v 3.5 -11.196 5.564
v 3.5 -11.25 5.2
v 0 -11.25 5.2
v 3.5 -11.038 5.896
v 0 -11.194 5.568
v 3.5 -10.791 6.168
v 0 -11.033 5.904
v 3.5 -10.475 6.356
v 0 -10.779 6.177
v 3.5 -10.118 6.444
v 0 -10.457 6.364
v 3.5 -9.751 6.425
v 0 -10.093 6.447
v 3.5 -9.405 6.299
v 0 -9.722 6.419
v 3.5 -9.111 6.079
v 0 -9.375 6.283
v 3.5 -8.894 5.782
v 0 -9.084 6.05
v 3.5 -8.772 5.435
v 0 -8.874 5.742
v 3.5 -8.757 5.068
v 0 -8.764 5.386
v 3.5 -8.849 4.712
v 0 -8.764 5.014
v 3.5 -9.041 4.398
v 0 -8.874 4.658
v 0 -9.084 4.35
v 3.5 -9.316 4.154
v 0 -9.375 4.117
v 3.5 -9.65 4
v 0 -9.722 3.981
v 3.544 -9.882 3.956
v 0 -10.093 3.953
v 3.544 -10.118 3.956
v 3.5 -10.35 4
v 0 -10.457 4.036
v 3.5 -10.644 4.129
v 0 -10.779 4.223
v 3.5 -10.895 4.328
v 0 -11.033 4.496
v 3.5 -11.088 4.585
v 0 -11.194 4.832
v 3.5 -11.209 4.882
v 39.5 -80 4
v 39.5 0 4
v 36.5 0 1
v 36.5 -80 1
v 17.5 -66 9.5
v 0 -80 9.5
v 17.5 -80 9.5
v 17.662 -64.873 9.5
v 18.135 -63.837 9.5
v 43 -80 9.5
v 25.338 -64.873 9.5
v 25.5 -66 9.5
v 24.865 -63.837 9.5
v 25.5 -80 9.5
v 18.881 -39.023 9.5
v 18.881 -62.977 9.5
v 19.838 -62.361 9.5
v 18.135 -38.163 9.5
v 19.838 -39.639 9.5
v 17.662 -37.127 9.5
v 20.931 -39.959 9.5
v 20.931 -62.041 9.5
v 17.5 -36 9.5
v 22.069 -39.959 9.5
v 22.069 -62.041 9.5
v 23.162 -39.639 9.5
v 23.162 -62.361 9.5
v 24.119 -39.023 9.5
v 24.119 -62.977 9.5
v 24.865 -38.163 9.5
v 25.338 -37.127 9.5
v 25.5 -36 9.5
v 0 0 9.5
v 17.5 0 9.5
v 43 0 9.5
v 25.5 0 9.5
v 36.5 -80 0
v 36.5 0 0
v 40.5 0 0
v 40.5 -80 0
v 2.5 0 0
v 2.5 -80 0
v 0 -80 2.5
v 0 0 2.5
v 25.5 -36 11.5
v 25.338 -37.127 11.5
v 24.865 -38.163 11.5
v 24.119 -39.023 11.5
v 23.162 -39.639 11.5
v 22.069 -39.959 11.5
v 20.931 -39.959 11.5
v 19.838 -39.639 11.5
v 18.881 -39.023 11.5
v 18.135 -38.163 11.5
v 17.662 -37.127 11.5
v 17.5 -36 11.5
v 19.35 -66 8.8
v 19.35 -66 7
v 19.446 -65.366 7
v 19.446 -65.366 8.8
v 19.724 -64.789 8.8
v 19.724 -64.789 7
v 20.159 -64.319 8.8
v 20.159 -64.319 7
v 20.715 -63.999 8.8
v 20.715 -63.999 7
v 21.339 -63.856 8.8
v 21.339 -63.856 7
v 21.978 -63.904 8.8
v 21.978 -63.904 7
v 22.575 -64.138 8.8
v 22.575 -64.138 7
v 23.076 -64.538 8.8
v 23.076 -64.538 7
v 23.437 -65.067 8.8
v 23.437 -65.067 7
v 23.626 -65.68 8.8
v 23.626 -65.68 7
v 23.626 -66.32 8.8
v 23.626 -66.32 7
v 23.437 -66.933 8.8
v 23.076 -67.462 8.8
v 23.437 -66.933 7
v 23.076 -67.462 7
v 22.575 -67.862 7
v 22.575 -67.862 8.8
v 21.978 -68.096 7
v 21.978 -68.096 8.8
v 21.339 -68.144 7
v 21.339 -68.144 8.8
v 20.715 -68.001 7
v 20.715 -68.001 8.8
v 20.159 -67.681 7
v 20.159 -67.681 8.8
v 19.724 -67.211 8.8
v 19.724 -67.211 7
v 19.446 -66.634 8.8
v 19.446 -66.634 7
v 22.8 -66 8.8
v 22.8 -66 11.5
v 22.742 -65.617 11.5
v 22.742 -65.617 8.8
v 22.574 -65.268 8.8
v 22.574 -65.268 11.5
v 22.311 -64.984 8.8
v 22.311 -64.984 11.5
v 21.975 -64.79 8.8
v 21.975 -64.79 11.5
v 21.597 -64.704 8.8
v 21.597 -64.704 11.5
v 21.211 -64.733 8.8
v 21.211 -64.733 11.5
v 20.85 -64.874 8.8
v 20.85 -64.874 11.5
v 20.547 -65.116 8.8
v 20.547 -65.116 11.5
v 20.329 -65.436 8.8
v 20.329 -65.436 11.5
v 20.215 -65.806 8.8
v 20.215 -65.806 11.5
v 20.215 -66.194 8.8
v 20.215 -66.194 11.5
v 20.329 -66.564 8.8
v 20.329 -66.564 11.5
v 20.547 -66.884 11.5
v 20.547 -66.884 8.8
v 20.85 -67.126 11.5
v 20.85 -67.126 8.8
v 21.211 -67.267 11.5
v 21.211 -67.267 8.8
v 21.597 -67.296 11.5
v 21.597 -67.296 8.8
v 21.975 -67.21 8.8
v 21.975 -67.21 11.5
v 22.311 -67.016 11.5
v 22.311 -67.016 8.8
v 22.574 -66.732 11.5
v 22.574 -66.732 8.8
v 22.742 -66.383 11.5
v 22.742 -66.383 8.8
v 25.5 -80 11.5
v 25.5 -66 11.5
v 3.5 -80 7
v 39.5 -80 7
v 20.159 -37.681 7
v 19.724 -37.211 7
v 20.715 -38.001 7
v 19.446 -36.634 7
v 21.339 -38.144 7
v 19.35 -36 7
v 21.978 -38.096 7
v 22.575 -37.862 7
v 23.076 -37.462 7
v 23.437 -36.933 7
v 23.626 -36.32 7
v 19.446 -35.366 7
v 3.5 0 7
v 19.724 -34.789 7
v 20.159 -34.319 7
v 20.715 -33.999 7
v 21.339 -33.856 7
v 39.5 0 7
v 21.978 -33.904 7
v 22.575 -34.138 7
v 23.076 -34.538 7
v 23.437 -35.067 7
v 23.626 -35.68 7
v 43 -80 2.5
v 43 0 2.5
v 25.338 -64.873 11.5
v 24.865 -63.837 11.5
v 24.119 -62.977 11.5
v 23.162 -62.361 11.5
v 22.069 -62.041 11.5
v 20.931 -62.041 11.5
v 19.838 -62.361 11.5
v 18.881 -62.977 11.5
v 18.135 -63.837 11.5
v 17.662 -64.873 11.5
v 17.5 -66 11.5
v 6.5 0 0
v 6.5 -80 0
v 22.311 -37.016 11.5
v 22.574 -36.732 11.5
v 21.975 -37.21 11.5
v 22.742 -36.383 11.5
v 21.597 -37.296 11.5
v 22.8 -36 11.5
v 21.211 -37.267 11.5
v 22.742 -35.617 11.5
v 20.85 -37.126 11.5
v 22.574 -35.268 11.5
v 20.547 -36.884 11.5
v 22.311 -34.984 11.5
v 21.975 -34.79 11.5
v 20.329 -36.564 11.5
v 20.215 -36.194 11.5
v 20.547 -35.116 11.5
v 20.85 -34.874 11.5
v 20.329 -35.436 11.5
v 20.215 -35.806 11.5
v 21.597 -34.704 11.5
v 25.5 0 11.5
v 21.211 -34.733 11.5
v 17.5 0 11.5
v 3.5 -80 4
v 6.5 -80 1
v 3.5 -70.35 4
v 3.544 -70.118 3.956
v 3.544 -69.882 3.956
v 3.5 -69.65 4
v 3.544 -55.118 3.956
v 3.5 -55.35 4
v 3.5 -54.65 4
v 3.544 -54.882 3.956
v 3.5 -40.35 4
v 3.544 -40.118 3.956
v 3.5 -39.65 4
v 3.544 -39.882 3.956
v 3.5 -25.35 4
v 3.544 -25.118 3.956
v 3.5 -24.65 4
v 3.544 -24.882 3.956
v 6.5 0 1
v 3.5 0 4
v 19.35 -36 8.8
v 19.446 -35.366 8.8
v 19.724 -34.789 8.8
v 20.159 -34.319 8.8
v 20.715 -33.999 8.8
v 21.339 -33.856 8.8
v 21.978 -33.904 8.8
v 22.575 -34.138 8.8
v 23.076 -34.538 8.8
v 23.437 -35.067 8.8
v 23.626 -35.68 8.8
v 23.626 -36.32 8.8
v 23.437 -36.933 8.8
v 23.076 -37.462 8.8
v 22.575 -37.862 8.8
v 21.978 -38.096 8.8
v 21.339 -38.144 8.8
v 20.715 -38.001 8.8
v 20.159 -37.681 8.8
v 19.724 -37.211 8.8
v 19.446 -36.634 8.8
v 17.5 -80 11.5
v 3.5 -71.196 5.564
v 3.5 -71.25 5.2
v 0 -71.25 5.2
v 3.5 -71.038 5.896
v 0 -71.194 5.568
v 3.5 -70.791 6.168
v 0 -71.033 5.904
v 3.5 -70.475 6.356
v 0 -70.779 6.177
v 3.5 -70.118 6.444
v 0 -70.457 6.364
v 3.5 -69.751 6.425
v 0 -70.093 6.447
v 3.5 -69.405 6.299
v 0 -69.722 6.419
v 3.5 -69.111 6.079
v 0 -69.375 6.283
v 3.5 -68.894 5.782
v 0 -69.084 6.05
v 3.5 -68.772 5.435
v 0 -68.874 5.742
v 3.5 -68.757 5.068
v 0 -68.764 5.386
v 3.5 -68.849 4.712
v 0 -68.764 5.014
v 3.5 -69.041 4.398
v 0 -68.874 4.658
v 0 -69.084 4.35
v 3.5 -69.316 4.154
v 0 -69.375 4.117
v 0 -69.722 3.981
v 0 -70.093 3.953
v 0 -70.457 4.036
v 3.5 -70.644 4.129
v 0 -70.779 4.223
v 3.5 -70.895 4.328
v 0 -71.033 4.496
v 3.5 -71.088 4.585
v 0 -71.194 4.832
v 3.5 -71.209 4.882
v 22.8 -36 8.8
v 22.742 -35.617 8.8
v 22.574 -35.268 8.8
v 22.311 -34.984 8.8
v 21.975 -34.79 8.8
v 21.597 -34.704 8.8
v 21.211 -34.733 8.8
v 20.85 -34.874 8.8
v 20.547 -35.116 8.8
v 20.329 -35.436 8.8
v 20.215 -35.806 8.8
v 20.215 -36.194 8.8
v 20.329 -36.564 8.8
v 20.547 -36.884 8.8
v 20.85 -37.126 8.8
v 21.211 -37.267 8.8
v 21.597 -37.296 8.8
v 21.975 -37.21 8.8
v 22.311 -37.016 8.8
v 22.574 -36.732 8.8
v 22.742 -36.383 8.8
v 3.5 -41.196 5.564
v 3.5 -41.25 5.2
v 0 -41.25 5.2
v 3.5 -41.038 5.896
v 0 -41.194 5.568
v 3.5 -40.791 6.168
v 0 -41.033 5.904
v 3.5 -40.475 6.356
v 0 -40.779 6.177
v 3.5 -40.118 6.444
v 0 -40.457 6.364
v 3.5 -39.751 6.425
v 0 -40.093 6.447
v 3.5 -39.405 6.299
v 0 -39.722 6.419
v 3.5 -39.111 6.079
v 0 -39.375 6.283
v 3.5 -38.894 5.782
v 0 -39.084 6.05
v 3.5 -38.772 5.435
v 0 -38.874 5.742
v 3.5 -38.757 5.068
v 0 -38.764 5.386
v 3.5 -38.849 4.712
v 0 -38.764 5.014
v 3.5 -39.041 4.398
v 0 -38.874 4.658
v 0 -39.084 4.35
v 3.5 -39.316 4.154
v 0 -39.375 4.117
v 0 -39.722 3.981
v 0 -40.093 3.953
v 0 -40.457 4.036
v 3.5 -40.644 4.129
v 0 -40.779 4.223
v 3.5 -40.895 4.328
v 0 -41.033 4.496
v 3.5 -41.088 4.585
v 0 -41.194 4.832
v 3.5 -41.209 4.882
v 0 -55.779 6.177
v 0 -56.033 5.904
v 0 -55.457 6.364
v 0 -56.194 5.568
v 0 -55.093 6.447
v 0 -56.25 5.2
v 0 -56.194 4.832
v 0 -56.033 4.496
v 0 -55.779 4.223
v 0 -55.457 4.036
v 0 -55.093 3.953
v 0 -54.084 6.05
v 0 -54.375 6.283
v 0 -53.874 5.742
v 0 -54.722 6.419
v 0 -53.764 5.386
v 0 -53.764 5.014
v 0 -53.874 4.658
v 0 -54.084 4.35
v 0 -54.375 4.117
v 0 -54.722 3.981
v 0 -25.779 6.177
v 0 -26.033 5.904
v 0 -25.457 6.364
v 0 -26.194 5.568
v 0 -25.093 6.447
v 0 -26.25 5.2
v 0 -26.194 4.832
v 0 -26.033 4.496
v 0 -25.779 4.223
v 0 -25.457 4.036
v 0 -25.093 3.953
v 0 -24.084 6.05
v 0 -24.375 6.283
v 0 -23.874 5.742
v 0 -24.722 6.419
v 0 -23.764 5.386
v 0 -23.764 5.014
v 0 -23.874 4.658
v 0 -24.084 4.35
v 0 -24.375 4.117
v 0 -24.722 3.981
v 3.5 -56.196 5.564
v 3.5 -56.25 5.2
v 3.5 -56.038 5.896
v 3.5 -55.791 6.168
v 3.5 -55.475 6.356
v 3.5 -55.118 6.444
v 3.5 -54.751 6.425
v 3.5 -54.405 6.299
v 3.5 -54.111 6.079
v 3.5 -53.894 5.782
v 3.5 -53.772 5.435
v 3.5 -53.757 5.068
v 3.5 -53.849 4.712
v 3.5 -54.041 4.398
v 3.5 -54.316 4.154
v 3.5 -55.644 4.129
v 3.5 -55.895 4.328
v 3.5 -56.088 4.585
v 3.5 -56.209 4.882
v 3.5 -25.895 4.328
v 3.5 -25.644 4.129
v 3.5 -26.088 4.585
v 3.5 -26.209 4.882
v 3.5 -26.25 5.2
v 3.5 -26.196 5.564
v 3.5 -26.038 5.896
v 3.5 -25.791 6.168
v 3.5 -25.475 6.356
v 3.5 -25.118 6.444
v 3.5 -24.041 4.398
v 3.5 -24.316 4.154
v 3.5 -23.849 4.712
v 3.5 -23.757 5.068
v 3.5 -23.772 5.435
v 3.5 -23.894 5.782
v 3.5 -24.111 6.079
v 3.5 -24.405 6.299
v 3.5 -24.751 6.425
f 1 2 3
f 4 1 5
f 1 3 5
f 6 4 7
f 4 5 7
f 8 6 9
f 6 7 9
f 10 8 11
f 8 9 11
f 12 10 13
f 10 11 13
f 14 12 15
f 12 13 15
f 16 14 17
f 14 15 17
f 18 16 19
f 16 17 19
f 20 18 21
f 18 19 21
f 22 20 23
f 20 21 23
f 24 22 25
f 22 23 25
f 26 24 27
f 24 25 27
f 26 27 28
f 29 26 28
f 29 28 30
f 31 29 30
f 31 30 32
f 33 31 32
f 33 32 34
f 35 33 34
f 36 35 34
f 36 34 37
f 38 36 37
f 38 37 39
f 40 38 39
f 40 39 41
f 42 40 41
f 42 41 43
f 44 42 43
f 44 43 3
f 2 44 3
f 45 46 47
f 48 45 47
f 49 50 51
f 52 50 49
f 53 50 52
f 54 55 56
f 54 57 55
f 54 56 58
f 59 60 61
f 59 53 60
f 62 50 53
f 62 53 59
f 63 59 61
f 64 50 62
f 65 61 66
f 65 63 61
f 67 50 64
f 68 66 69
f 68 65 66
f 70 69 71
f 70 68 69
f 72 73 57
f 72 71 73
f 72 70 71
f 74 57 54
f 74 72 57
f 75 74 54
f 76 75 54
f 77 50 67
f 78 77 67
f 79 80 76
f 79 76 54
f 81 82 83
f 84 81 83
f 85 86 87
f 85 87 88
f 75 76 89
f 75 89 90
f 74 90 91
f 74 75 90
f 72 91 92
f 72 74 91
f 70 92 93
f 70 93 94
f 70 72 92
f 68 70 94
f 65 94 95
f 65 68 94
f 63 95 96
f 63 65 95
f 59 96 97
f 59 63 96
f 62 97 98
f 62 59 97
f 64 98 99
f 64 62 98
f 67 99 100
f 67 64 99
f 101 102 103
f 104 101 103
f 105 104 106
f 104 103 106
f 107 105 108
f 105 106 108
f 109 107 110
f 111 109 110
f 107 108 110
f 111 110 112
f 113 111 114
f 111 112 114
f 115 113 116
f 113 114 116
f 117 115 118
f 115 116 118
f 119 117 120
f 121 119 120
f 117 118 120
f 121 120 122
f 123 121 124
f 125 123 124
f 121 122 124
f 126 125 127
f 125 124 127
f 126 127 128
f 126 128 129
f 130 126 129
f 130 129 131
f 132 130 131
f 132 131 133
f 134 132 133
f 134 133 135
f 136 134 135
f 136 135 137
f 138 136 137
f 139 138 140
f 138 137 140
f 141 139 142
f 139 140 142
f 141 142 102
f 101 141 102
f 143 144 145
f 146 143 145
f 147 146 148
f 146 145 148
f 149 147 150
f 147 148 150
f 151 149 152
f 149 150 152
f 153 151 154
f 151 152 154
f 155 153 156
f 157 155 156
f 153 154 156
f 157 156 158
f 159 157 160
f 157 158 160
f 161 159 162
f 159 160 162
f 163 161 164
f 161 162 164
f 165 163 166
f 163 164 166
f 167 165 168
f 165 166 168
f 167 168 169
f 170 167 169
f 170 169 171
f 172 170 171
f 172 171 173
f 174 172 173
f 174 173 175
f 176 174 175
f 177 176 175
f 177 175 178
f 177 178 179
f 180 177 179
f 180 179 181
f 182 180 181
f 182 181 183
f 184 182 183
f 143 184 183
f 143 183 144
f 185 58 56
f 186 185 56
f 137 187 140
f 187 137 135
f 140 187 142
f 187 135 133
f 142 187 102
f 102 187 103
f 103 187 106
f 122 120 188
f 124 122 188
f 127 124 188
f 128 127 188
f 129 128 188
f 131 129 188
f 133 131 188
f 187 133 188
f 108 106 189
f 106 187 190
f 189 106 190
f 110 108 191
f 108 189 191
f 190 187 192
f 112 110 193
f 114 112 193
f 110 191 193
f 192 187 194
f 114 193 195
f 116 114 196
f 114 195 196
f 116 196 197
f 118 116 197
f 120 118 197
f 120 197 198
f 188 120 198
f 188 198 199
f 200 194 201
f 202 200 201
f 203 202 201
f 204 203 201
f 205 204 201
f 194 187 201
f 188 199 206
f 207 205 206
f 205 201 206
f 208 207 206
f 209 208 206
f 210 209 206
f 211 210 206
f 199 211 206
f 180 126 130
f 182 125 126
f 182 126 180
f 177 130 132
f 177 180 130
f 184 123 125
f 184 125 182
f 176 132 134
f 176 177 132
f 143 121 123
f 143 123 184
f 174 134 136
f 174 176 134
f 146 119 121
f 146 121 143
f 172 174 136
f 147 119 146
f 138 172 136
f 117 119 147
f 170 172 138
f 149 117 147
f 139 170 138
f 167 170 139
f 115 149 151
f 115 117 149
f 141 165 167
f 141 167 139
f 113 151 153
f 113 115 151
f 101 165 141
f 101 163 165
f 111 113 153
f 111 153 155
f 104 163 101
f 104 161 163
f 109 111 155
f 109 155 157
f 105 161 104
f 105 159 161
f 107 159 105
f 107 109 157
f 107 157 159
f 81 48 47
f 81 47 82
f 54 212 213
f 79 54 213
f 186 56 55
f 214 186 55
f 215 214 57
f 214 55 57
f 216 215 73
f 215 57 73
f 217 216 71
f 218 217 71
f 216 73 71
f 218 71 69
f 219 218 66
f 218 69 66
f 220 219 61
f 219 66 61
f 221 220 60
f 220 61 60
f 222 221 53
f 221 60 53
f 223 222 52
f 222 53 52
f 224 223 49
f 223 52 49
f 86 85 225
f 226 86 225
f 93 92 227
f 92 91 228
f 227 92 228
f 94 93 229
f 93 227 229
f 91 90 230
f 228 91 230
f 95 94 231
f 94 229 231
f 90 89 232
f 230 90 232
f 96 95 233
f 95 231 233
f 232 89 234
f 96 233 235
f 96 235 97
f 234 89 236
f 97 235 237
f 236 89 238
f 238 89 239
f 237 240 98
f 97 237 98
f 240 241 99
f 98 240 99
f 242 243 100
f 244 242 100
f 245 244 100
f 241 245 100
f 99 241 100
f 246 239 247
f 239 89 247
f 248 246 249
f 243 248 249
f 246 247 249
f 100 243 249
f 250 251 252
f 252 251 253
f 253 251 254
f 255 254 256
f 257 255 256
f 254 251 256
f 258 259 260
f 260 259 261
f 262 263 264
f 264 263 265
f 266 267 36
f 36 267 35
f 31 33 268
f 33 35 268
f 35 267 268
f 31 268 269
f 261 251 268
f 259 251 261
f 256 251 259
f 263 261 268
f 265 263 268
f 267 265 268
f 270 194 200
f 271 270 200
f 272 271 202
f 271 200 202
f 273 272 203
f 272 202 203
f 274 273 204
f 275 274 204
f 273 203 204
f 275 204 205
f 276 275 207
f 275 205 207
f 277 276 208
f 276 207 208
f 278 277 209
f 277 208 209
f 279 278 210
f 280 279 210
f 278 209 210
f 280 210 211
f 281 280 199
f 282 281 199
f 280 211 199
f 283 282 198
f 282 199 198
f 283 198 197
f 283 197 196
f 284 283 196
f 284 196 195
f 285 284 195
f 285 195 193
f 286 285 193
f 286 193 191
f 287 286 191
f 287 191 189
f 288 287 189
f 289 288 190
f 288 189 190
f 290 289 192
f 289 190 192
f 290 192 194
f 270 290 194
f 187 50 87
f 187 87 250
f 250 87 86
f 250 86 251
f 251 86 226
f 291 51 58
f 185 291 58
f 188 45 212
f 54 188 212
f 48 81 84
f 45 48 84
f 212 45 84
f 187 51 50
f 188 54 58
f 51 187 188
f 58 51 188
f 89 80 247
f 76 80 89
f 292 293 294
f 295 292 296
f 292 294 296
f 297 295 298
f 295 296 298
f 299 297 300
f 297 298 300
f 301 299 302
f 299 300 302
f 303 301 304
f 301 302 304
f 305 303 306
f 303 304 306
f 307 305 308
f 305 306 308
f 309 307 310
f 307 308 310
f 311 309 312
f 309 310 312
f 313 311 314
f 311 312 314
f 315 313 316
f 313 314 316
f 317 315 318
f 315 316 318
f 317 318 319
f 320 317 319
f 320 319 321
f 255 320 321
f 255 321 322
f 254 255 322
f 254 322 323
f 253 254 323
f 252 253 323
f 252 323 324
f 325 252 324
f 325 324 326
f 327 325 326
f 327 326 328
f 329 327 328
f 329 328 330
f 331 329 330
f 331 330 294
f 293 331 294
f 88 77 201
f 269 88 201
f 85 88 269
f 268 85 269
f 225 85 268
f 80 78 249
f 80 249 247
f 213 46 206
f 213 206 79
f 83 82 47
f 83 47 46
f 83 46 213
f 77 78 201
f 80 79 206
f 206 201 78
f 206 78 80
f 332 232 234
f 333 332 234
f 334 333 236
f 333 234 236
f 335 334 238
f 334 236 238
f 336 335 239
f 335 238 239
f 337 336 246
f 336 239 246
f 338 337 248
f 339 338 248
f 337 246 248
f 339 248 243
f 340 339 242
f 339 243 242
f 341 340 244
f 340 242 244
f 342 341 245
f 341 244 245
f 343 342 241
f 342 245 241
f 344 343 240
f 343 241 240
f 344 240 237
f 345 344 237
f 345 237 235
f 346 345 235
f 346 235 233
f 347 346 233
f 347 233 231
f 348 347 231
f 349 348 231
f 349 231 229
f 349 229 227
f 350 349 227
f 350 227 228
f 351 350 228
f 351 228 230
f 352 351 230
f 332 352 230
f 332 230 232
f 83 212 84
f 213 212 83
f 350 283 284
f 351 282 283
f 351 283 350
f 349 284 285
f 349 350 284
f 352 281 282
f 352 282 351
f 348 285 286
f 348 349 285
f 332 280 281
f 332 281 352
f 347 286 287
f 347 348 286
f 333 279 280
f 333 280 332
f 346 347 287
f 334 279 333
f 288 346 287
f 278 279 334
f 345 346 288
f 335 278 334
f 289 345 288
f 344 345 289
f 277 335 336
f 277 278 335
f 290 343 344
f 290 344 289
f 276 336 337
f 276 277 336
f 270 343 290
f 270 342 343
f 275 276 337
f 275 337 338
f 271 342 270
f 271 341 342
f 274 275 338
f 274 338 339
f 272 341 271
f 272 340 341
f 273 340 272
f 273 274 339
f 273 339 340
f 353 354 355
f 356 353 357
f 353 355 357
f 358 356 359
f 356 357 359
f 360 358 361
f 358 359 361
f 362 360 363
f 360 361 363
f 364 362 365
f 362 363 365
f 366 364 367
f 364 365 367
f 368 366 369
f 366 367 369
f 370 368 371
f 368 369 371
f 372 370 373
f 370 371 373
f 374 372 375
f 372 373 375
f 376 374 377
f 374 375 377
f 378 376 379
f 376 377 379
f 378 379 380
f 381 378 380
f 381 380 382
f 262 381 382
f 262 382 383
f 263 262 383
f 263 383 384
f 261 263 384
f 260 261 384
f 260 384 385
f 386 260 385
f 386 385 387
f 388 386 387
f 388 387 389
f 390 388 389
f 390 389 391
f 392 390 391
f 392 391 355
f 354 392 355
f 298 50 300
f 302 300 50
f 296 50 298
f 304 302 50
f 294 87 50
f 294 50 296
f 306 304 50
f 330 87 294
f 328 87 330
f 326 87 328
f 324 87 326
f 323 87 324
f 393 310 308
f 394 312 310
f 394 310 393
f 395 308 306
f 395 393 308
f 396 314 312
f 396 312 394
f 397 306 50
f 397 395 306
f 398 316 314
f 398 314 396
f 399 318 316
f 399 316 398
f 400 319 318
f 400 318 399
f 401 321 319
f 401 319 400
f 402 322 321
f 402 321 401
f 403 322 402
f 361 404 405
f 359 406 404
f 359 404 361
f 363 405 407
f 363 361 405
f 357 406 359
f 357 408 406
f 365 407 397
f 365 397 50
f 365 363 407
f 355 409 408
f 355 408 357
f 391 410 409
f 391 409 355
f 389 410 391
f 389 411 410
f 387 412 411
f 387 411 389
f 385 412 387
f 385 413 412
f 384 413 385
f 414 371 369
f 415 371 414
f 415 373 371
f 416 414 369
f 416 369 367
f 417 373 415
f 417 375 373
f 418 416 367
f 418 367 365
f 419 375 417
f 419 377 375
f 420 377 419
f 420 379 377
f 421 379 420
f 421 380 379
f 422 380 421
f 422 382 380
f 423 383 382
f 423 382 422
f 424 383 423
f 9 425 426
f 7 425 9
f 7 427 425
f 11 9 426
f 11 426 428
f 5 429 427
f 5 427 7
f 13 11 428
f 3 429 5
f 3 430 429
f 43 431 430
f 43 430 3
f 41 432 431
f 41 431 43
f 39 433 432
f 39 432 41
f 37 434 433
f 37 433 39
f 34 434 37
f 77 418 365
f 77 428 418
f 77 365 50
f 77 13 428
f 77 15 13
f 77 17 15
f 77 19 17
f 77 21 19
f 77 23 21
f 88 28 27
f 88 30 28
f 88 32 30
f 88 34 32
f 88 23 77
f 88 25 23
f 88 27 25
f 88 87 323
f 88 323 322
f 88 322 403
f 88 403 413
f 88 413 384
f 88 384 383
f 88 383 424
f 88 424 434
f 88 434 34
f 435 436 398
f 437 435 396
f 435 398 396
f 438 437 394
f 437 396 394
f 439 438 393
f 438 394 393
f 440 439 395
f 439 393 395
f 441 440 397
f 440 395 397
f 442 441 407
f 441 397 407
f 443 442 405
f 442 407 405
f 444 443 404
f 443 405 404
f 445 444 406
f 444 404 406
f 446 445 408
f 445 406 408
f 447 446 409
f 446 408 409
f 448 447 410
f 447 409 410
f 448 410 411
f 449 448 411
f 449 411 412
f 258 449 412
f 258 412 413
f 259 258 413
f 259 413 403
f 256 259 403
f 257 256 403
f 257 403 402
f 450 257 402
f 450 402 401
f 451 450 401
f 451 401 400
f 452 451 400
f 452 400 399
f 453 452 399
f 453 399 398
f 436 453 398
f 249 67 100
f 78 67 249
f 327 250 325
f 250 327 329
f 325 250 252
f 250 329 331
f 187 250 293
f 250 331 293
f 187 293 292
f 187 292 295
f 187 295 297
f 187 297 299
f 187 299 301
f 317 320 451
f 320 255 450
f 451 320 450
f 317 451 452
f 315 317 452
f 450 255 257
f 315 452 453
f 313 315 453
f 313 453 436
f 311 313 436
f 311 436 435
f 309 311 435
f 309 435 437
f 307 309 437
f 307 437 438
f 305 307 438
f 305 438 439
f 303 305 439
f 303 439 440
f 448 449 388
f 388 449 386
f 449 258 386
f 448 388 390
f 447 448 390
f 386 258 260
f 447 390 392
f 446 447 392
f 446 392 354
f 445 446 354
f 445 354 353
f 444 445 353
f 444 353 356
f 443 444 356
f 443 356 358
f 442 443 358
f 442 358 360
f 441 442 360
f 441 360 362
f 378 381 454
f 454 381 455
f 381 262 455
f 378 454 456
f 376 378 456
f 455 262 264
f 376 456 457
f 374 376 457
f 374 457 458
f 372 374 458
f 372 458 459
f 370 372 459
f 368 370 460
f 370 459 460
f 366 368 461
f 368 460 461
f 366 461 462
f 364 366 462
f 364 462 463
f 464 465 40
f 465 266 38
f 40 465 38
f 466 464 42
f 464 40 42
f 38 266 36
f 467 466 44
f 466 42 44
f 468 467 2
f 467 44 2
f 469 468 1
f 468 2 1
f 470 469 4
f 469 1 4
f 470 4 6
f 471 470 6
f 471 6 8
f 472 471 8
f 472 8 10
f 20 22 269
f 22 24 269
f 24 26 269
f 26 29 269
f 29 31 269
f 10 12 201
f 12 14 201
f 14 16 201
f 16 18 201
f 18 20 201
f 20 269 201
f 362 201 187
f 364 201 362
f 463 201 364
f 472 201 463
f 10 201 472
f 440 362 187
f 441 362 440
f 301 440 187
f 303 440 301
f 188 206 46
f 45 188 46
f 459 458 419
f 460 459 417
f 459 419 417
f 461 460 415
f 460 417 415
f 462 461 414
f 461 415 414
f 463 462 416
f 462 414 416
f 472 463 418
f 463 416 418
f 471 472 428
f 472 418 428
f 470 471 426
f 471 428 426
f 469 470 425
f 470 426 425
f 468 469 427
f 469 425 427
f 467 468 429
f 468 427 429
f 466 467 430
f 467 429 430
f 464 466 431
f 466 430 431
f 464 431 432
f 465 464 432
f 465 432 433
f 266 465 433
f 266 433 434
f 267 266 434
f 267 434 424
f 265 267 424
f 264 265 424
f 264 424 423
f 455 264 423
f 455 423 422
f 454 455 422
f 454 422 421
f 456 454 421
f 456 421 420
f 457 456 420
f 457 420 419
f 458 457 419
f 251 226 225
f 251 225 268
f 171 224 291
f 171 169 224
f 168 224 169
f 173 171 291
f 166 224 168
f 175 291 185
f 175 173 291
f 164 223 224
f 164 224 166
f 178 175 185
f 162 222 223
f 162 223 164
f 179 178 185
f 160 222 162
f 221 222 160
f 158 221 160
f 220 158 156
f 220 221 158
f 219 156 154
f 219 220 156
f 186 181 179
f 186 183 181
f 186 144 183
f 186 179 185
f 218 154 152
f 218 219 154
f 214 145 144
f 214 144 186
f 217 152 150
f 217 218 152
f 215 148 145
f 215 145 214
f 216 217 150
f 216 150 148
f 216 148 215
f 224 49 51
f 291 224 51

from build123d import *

# Parameters (mm, degrees)
SKETCH_1_W          = 43
SKETCH_1_H          = 80
EXTRUDE_1_DEPTH     = 9.5
CUT_EXTRUDE_1_DEPTH = 92.319494085
CHAMFER_1_SIZE      = 2.5
EXTRUDE_2_DEPTH     = 2
SKETCH_4_R          = 1.3
CUT_EXTRUDE_2_DEPTH = 92.549167118
SKETCH_5_R          = 2.15
CUT_EXTRUDE_3_DEPTH = 1.8
SKETCH_7_R          = 1.25
CUT_EXTRUDE_4_DEPTH = 5


with BuildPart() as part:
    # 草图1 → 凸台-拉伸1 (new body)
    with BuildSketch(Plane.XY):
        with Locations((21.5, -40)):
            Rectangle(SKETCH_1_W, SKETCH_1_H)
    extrude(amount=EXTRUDE_1_DEPTH)

    # 草图2 → 切除-拉伸1 (cut, through all)
    with BuildSketch(Plane(origin=(0, 0, 0), x_dir=(1, 0, 0), z_dir=(0, 1, 0))):
        Polygon((6.5, 0), (6.5, -1), (3.5, -4), (3.5, -7), (39.5, -7), (39.5, -4), (36.5, -1), (36.5, 0), align=None)
    extrude(amount=-CUT_EXTRUDE_1_DEPTH, mode=Mode.SUBTRACT)

    # 倒角1
    chamfer_1_edges = [part.edges().sort_by_distance(p)[0] for p in [
        (43, -40, 0),
        (0, -40, 0),
    ]]
    chamfer(chamfer_1_edges, length=CHAMFER_1_SIZE)

    # 草图3 → 凸台-拉伸2 (add)
    with BuildSketch(Plane.XY.offset(9.5)):
        with BuildLine():
            Line((17.5, -80), (25.5, -80))
            Line((25.5, -80), (25.5, -66))
            ThreePointArc((25.5, -66), (21.5, -62), (17.5, -66))
            Line((17.5, -66), (17.5, -80))
        make_face()
        with BuildLine():
            Line((17.5, -36), (17.5, 0))
            Line((17.5, 0), (25.5, 0))
            Line((25.5, 0), (25.5, -36))
            ThreePointArc((25.5, -36), (21.5, -40), (17.5, -36))
        make_face()
    extrude(amount=EXTRUDE_2_DEPTH)

    # 草图4 → 切除-拉伸2 (cut, through all)
    with BuildSketch(Plane.XY.offset(11.5)):
        with Locations((21.5, -36)):
            Circle(SKETCH_4_R)
        with Locations((21.5, -66)):
            Circle(SKETCH_4_R)
    extrude(amount=-CUT_EXTRUDE_2_DEPTH, mode=Mode.SUBTRACT)

    # 草图5 → 切除-拉伸3 (cut)
    with BuildSketch(Plane(origin=(0, 0, 7), x_dir=(-1, 0, 0), z_dir=(0, 0, -1))):
        with Locations((-21.5, -36)):
            Circle(SKETCH_5_R)
        with Locations((-21.5, -66)):
            Circle(SKETCH_5_R)
    extrude(amount=-CUT_EXTRUDE_3_DEPTH, mode=Mode.SUBTRACT)

    # 草图7 → 切除-拉伸4 (cut)
    with BuildSketch(Plane.ZY):
        with Locations(Location((5.2, -10, 0), (0, 0, 270))):
            Circle(SKETCH_7_R)
        with Locations(Location((5.2, -25, 0), (0, 0, 270))):
            Circle(SKETCH_7_R)
        with Locations(Location((5.2, -40, 0), (0, 0, 270))):
            Circle(SKETCH_7_R)
        with Locations(Location((5.2, -55, 0), (0, 0, 270))):
            Circle(SKETCH_7_R)
        with Locations(Location((5.2, -70, 0), (0, 0, 270))):
            Circle(SKETCH_7_R)
    extrude(amount=-CUT_EXTRUDE_4_DEPTH, mode=Mode.SUBTRACT)


solid = part.part
